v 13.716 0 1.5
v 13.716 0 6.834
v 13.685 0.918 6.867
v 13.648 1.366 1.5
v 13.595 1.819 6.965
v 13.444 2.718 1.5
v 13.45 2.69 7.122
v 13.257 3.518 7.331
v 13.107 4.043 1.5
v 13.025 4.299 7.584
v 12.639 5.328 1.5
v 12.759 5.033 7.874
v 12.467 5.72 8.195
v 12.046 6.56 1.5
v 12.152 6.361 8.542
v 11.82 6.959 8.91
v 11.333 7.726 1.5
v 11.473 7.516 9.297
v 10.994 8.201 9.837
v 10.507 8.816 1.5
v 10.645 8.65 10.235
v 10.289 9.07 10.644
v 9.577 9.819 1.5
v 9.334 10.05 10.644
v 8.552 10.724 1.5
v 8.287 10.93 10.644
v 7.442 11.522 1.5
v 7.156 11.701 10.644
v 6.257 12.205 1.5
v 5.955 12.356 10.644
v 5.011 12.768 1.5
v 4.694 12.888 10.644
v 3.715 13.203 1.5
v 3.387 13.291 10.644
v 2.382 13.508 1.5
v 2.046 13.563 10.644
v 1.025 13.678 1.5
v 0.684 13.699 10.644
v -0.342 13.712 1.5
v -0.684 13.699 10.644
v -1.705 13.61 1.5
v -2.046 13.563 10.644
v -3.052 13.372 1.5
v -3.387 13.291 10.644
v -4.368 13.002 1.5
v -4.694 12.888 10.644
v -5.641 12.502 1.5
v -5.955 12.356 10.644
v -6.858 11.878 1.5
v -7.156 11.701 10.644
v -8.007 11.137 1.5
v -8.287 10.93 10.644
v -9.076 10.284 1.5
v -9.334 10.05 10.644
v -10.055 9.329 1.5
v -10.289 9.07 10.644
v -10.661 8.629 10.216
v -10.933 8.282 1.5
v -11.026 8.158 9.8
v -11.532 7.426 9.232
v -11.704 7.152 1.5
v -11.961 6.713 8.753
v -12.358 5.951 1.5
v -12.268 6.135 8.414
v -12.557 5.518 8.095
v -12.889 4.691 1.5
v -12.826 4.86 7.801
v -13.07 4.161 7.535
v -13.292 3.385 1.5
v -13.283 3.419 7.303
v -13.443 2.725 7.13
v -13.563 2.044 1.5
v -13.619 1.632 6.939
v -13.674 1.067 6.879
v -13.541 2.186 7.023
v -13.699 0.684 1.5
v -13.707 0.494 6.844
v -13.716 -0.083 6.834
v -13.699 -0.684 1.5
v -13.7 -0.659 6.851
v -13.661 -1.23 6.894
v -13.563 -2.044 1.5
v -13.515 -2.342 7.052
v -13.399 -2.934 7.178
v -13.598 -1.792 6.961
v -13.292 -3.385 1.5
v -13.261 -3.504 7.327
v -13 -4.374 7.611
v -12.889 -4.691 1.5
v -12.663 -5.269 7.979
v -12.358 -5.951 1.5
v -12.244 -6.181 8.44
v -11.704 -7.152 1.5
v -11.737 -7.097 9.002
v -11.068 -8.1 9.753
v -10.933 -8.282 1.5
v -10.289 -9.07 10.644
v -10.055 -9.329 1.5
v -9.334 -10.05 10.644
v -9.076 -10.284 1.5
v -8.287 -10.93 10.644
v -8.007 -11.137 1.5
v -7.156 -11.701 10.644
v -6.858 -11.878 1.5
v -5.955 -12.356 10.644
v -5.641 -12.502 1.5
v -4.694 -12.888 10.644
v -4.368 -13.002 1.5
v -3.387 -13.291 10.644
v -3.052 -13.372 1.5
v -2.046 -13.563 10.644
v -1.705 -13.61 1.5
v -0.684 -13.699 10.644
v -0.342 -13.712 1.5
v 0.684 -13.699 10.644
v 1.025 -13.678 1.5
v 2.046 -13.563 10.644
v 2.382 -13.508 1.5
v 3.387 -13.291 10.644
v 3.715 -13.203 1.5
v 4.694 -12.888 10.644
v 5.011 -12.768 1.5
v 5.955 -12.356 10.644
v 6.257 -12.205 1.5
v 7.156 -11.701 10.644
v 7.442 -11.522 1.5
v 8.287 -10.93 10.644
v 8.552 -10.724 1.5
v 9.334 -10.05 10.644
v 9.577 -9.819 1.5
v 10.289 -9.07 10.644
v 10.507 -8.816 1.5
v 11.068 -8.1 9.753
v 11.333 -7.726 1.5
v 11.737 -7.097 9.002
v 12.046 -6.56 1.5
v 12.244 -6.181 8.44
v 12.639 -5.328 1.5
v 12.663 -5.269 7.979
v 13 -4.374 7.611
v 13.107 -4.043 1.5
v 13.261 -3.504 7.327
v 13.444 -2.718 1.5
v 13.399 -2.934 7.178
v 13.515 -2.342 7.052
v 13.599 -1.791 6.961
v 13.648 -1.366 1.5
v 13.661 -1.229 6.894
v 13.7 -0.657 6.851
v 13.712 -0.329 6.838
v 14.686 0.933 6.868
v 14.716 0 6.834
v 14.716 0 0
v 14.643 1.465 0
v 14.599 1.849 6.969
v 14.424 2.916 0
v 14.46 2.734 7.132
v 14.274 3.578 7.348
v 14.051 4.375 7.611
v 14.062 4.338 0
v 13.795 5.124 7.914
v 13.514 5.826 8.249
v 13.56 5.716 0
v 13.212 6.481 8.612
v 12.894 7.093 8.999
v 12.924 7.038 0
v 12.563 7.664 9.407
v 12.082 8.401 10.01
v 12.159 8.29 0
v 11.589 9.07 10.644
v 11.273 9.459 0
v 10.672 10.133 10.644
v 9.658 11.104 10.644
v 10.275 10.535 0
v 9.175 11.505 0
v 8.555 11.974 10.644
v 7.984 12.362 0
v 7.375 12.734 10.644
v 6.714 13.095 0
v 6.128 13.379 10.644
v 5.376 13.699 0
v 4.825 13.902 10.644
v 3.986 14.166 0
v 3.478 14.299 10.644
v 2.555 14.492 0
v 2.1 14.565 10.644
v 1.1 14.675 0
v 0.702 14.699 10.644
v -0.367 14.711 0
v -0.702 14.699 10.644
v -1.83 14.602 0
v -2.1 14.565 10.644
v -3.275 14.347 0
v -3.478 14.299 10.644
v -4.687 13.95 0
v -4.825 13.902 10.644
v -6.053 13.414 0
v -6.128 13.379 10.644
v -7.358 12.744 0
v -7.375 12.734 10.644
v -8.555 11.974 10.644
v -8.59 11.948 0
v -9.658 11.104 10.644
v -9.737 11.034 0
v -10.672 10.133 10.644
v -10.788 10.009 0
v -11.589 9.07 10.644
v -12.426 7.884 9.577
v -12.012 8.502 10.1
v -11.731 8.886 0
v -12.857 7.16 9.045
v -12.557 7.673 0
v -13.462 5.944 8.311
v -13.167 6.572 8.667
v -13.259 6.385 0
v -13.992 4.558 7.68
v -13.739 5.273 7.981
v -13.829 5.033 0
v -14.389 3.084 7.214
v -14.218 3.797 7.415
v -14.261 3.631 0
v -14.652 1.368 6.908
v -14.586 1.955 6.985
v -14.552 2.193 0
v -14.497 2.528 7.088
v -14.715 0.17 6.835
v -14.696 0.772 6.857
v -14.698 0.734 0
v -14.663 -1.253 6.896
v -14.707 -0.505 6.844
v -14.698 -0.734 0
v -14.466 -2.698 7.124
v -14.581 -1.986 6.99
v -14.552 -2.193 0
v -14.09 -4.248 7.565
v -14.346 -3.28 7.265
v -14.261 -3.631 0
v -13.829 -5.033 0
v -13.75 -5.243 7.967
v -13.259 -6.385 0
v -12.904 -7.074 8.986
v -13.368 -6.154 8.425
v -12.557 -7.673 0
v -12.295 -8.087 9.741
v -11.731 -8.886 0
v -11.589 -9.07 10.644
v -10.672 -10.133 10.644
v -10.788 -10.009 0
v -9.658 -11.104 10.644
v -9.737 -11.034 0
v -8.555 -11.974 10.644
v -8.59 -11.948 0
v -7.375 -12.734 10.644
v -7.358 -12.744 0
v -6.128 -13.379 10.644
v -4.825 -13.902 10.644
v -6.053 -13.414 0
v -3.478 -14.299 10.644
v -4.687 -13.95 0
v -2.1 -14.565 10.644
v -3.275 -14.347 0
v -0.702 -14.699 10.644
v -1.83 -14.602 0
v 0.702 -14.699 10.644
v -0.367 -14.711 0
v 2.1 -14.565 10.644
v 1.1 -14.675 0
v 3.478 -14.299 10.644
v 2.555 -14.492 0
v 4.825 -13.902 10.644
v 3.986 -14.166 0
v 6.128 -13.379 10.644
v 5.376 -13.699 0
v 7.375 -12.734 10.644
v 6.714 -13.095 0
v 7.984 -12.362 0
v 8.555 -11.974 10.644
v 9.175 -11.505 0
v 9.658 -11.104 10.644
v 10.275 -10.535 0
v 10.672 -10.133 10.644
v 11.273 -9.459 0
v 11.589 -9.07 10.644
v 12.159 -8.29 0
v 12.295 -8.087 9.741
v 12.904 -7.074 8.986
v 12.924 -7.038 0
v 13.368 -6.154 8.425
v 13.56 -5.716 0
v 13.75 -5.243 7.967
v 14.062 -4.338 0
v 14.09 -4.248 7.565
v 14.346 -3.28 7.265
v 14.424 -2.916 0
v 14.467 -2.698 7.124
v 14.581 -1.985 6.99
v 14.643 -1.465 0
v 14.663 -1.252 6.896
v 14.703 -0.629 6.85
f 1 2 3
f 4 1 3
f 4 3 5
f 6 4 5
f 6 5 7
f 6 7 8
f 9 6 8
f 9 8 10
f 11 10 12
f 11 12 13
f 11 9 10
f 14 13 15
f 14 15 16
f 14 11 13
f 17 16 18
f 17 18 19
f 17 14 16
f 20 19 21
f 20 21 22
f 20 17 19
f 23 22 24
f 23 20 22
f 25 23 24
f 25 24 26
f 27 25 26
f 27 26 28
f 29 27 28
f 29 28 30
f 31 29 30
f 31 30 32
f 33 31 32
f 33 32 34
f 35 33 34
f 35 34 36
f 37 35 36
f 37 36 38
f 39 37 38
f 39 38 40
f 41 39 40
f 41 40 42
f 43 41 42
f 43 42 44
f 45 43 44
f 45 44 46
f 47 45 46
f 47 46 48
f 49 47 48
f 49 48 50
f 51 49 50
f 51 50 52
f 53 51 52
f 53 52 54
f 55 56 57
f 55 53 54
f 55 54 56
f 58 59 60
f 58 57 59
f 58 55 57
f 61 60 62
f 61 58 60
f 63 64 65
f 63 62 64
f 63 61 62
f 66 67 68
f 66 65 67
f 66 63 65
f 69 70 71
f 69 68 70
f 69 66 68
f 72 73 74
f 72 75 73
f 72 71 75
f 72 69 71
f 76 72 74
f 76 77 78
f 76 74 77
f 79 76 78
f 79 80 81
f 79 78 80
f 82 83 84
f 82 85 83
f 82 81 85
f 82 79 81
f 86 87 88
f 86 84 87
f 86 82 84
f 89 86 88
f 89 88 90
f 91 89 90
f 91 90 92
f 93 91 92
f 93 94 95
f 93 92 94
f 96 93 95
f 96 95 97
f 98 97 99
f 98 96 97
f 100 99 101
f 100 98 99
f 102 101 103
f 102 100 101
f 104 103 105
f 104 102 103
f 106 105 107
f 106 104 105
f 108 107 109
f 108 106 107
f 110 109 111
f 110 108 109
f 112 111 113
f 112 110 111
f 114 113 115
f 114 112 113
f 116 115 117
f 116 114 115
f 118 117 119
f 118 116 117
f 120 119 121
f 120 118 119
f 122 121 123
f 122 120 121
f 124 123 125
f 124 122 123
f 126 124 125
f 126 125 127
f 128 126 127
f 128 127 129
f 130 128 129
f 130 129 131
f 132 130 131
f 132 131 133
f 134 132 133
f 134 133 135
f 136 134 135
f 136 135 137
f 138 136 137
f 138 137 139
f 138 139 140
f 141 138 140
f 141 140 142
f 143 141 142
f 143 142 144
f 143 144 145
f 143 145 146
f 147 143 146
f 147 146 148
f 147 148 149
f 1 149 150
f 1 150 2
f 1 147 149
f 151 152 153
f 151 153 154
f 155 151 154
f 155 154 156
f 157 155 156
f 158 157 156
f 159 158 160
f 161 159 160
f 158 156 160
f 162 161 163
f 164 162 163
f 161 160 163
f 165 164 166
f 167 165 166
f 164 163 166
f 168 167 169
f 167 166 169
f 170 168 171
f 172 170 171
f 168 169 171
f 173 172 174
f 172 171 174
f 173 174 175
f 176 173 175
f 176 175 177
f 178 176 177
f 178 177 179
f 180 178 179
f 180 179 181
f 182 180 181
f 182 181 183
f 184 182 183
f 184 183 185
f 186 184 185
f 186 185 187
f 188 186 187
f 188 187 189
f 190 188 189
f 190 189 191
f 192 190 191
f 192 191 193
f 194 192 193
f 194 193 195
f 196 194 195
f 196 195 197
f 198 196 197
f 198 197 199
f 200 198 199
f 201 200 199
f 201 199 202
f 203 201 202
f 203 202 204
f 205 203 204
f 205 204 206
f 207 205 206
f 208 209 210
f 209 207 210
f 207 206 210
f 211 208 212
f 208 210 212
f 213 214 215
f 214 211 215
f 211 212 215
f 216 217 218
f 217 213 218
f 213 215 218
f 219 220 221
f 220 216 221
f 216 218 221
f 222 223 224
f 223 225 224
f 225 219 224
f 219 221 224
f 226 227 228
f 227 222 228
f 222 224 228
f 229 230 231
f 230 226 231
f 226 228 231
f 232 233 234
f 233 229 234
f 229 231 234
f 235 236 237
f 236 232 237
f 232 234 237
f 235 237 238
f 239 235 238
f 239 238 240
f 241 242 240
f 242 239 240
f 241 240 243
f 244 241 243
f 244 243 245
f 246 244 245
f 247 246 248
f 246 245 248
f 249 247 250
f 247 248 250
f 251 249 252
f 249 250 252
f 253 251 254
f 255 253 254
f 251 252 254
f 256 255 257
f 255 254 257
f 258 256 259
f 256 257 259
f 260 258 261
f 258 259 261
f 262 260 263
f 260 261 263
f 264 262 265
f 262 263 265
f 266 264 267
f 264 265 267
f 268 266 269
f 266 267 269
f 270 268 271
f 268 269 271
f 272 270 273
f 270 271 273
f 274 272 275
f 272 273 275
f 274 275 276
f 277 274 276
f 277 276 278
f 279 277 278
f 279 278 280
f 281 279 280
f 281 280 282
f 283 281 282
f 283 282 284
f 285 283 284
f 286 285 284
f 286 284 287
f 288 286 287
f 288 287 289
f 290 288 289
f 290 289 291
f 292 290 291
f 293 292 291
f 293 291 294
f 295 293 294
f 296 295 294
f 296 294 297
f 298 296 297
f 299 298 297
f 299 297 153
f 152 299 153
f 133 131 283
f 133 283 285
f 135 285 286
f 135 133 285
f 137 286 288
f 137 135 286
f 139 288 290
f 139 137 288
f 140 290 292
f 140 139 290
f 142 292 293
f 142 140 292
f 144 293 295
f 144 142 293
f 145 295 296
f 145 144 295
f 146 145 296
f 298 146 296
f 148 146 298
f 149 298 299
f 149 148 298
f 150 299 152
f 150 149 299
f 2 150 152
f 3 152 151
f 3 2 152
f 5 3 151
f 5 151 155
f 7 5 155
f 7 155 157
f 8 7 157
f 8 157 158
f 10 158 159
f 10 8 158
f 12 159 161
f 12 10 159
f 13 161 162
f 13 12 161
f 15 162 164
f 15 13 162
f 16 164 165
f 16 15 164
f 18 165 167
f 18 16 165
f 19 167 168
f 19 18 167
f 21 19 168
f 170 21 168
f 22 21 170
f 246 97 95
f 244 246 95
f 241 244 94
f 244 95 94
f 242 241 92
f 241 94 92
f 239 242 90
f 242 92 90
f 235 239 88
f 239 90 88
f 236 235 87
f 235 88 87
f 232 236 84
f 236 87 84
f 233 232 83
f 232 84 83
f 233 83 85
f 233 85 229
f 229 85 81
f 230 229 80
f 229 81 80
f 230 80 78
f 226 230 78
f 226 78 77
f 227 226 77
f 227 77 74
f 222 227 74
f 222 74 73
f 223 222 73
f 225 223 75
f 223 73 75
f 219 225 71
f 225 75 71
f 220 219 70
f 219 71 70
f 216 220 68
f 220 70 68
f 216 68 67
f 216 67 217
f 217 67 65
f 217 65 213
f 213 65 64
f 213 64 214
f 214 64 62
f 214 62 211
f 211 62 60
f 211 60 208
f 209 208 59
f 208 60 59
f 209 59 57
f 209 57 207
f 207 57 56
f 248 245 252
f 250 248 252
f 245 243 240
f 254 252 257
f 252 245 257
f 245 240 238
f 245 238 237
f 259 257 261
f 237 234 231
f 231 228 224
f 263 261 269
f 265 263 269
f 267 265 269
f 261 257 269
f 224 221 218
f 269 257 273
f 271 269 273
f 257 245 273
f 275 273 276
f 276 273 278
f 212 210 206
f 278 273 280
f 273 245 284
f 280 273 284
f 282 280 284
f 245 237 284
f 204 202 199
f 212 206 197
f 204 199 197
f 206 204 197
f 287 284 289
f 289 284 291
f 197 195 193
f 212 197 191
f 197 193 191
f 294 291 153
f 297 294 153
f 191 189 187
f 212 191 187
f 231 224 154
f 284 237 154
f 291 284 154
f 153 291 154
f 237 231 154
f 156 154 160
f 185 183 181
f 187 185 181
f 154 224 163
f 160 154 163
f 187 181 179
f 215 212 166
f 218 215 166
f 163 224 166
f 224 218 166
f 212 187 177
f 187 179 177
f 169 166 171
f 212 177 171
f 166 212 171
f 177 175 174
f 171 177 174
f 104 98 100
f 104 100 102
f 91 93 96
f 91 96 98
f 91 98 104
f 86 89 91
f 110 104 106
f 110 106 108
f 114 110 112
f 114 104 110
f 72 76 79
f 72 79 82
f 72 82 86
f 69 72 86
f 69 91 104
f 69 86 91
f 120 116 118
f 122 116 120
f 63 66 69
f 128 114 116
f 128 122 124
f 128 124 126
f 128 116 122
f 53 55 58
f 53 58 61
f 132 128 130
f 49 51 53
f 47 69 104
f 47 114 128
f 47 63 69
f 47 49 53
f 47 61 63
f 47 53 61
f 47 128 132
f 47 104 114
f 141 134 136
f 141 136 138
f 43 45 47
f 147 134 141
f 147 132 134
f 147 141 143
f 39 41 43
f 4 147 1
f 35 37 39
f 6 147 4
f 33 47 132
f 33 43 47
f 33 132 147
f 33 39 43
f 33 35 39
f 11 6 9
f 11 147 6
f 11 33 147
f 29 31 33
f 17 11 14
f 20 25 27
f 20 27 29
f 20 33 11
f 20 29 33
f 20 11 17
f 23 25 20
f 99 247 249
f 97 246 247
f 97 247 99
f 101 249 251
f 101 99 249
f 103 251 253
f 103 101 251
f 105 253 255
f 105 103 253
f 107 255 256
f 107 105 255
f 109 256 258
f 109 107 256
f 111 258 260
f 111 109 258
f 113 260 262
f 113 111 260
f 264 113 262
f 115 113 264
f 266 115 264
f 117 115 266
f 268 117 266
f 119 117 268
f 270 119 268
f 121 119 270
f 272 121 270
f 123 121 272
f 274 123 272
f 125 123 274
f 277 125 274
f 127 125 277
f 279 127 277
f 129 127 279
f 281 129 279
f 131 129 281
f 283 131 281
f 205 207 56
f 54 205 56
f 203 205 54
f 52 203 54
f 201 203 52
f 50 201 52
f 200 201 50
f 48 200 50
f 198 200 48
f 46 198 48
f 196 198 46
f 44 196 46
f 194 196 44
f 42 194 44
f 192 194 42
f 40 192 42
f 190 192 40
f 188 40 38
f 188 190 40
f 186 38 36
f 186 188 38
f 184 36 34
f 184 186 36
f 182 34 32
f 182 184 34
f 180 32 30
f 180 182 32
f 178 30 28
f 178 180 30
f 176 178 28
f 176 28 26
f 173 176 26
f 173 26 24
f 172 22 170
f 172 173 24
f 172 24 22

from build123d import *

# Parameters (mm, degrees)
F2_R          = 14.716
F3_DEPTH      = 1.5
F4_R          = 14.716
F4_R_2        = 13.716
F5_DEPTH      = 9.144
F6_R          = 12.7
F7_DEPTH      = 14.717
F7_DEPTH_BACK = 14.717


with BuildPart() as f3:
    # F2 (on Top) → F3 (new body)
    with BuildSketch(Plane.XY):
        Circle(F2_R)
    extrude(amount=F3_DEPTH)

    # F4 (on face) → F5 (join)
    with BuildSketch(Plane.XY.offset(1.5)):
        Circle(F4_R)
        Circle(F4_R_2, mode=Mode.SUBTRACT)
    extrude(amount=F5_DEPTH)

    # F6 (on Right) → F7 (cut, two sides)
    with BuildSketch(Plane.YZ) as f7_sk:
        with Locations((0, 19.534)):
            Circle(F6_R)
    extrude(amount=-F7_DEPTH, mode=Mode.SUBTRACT)
    extrude(f7_sk.sketch, amount=F7_DEPTH_BACK, mode=Mode.SUBTRACT)


solid = f3.part
